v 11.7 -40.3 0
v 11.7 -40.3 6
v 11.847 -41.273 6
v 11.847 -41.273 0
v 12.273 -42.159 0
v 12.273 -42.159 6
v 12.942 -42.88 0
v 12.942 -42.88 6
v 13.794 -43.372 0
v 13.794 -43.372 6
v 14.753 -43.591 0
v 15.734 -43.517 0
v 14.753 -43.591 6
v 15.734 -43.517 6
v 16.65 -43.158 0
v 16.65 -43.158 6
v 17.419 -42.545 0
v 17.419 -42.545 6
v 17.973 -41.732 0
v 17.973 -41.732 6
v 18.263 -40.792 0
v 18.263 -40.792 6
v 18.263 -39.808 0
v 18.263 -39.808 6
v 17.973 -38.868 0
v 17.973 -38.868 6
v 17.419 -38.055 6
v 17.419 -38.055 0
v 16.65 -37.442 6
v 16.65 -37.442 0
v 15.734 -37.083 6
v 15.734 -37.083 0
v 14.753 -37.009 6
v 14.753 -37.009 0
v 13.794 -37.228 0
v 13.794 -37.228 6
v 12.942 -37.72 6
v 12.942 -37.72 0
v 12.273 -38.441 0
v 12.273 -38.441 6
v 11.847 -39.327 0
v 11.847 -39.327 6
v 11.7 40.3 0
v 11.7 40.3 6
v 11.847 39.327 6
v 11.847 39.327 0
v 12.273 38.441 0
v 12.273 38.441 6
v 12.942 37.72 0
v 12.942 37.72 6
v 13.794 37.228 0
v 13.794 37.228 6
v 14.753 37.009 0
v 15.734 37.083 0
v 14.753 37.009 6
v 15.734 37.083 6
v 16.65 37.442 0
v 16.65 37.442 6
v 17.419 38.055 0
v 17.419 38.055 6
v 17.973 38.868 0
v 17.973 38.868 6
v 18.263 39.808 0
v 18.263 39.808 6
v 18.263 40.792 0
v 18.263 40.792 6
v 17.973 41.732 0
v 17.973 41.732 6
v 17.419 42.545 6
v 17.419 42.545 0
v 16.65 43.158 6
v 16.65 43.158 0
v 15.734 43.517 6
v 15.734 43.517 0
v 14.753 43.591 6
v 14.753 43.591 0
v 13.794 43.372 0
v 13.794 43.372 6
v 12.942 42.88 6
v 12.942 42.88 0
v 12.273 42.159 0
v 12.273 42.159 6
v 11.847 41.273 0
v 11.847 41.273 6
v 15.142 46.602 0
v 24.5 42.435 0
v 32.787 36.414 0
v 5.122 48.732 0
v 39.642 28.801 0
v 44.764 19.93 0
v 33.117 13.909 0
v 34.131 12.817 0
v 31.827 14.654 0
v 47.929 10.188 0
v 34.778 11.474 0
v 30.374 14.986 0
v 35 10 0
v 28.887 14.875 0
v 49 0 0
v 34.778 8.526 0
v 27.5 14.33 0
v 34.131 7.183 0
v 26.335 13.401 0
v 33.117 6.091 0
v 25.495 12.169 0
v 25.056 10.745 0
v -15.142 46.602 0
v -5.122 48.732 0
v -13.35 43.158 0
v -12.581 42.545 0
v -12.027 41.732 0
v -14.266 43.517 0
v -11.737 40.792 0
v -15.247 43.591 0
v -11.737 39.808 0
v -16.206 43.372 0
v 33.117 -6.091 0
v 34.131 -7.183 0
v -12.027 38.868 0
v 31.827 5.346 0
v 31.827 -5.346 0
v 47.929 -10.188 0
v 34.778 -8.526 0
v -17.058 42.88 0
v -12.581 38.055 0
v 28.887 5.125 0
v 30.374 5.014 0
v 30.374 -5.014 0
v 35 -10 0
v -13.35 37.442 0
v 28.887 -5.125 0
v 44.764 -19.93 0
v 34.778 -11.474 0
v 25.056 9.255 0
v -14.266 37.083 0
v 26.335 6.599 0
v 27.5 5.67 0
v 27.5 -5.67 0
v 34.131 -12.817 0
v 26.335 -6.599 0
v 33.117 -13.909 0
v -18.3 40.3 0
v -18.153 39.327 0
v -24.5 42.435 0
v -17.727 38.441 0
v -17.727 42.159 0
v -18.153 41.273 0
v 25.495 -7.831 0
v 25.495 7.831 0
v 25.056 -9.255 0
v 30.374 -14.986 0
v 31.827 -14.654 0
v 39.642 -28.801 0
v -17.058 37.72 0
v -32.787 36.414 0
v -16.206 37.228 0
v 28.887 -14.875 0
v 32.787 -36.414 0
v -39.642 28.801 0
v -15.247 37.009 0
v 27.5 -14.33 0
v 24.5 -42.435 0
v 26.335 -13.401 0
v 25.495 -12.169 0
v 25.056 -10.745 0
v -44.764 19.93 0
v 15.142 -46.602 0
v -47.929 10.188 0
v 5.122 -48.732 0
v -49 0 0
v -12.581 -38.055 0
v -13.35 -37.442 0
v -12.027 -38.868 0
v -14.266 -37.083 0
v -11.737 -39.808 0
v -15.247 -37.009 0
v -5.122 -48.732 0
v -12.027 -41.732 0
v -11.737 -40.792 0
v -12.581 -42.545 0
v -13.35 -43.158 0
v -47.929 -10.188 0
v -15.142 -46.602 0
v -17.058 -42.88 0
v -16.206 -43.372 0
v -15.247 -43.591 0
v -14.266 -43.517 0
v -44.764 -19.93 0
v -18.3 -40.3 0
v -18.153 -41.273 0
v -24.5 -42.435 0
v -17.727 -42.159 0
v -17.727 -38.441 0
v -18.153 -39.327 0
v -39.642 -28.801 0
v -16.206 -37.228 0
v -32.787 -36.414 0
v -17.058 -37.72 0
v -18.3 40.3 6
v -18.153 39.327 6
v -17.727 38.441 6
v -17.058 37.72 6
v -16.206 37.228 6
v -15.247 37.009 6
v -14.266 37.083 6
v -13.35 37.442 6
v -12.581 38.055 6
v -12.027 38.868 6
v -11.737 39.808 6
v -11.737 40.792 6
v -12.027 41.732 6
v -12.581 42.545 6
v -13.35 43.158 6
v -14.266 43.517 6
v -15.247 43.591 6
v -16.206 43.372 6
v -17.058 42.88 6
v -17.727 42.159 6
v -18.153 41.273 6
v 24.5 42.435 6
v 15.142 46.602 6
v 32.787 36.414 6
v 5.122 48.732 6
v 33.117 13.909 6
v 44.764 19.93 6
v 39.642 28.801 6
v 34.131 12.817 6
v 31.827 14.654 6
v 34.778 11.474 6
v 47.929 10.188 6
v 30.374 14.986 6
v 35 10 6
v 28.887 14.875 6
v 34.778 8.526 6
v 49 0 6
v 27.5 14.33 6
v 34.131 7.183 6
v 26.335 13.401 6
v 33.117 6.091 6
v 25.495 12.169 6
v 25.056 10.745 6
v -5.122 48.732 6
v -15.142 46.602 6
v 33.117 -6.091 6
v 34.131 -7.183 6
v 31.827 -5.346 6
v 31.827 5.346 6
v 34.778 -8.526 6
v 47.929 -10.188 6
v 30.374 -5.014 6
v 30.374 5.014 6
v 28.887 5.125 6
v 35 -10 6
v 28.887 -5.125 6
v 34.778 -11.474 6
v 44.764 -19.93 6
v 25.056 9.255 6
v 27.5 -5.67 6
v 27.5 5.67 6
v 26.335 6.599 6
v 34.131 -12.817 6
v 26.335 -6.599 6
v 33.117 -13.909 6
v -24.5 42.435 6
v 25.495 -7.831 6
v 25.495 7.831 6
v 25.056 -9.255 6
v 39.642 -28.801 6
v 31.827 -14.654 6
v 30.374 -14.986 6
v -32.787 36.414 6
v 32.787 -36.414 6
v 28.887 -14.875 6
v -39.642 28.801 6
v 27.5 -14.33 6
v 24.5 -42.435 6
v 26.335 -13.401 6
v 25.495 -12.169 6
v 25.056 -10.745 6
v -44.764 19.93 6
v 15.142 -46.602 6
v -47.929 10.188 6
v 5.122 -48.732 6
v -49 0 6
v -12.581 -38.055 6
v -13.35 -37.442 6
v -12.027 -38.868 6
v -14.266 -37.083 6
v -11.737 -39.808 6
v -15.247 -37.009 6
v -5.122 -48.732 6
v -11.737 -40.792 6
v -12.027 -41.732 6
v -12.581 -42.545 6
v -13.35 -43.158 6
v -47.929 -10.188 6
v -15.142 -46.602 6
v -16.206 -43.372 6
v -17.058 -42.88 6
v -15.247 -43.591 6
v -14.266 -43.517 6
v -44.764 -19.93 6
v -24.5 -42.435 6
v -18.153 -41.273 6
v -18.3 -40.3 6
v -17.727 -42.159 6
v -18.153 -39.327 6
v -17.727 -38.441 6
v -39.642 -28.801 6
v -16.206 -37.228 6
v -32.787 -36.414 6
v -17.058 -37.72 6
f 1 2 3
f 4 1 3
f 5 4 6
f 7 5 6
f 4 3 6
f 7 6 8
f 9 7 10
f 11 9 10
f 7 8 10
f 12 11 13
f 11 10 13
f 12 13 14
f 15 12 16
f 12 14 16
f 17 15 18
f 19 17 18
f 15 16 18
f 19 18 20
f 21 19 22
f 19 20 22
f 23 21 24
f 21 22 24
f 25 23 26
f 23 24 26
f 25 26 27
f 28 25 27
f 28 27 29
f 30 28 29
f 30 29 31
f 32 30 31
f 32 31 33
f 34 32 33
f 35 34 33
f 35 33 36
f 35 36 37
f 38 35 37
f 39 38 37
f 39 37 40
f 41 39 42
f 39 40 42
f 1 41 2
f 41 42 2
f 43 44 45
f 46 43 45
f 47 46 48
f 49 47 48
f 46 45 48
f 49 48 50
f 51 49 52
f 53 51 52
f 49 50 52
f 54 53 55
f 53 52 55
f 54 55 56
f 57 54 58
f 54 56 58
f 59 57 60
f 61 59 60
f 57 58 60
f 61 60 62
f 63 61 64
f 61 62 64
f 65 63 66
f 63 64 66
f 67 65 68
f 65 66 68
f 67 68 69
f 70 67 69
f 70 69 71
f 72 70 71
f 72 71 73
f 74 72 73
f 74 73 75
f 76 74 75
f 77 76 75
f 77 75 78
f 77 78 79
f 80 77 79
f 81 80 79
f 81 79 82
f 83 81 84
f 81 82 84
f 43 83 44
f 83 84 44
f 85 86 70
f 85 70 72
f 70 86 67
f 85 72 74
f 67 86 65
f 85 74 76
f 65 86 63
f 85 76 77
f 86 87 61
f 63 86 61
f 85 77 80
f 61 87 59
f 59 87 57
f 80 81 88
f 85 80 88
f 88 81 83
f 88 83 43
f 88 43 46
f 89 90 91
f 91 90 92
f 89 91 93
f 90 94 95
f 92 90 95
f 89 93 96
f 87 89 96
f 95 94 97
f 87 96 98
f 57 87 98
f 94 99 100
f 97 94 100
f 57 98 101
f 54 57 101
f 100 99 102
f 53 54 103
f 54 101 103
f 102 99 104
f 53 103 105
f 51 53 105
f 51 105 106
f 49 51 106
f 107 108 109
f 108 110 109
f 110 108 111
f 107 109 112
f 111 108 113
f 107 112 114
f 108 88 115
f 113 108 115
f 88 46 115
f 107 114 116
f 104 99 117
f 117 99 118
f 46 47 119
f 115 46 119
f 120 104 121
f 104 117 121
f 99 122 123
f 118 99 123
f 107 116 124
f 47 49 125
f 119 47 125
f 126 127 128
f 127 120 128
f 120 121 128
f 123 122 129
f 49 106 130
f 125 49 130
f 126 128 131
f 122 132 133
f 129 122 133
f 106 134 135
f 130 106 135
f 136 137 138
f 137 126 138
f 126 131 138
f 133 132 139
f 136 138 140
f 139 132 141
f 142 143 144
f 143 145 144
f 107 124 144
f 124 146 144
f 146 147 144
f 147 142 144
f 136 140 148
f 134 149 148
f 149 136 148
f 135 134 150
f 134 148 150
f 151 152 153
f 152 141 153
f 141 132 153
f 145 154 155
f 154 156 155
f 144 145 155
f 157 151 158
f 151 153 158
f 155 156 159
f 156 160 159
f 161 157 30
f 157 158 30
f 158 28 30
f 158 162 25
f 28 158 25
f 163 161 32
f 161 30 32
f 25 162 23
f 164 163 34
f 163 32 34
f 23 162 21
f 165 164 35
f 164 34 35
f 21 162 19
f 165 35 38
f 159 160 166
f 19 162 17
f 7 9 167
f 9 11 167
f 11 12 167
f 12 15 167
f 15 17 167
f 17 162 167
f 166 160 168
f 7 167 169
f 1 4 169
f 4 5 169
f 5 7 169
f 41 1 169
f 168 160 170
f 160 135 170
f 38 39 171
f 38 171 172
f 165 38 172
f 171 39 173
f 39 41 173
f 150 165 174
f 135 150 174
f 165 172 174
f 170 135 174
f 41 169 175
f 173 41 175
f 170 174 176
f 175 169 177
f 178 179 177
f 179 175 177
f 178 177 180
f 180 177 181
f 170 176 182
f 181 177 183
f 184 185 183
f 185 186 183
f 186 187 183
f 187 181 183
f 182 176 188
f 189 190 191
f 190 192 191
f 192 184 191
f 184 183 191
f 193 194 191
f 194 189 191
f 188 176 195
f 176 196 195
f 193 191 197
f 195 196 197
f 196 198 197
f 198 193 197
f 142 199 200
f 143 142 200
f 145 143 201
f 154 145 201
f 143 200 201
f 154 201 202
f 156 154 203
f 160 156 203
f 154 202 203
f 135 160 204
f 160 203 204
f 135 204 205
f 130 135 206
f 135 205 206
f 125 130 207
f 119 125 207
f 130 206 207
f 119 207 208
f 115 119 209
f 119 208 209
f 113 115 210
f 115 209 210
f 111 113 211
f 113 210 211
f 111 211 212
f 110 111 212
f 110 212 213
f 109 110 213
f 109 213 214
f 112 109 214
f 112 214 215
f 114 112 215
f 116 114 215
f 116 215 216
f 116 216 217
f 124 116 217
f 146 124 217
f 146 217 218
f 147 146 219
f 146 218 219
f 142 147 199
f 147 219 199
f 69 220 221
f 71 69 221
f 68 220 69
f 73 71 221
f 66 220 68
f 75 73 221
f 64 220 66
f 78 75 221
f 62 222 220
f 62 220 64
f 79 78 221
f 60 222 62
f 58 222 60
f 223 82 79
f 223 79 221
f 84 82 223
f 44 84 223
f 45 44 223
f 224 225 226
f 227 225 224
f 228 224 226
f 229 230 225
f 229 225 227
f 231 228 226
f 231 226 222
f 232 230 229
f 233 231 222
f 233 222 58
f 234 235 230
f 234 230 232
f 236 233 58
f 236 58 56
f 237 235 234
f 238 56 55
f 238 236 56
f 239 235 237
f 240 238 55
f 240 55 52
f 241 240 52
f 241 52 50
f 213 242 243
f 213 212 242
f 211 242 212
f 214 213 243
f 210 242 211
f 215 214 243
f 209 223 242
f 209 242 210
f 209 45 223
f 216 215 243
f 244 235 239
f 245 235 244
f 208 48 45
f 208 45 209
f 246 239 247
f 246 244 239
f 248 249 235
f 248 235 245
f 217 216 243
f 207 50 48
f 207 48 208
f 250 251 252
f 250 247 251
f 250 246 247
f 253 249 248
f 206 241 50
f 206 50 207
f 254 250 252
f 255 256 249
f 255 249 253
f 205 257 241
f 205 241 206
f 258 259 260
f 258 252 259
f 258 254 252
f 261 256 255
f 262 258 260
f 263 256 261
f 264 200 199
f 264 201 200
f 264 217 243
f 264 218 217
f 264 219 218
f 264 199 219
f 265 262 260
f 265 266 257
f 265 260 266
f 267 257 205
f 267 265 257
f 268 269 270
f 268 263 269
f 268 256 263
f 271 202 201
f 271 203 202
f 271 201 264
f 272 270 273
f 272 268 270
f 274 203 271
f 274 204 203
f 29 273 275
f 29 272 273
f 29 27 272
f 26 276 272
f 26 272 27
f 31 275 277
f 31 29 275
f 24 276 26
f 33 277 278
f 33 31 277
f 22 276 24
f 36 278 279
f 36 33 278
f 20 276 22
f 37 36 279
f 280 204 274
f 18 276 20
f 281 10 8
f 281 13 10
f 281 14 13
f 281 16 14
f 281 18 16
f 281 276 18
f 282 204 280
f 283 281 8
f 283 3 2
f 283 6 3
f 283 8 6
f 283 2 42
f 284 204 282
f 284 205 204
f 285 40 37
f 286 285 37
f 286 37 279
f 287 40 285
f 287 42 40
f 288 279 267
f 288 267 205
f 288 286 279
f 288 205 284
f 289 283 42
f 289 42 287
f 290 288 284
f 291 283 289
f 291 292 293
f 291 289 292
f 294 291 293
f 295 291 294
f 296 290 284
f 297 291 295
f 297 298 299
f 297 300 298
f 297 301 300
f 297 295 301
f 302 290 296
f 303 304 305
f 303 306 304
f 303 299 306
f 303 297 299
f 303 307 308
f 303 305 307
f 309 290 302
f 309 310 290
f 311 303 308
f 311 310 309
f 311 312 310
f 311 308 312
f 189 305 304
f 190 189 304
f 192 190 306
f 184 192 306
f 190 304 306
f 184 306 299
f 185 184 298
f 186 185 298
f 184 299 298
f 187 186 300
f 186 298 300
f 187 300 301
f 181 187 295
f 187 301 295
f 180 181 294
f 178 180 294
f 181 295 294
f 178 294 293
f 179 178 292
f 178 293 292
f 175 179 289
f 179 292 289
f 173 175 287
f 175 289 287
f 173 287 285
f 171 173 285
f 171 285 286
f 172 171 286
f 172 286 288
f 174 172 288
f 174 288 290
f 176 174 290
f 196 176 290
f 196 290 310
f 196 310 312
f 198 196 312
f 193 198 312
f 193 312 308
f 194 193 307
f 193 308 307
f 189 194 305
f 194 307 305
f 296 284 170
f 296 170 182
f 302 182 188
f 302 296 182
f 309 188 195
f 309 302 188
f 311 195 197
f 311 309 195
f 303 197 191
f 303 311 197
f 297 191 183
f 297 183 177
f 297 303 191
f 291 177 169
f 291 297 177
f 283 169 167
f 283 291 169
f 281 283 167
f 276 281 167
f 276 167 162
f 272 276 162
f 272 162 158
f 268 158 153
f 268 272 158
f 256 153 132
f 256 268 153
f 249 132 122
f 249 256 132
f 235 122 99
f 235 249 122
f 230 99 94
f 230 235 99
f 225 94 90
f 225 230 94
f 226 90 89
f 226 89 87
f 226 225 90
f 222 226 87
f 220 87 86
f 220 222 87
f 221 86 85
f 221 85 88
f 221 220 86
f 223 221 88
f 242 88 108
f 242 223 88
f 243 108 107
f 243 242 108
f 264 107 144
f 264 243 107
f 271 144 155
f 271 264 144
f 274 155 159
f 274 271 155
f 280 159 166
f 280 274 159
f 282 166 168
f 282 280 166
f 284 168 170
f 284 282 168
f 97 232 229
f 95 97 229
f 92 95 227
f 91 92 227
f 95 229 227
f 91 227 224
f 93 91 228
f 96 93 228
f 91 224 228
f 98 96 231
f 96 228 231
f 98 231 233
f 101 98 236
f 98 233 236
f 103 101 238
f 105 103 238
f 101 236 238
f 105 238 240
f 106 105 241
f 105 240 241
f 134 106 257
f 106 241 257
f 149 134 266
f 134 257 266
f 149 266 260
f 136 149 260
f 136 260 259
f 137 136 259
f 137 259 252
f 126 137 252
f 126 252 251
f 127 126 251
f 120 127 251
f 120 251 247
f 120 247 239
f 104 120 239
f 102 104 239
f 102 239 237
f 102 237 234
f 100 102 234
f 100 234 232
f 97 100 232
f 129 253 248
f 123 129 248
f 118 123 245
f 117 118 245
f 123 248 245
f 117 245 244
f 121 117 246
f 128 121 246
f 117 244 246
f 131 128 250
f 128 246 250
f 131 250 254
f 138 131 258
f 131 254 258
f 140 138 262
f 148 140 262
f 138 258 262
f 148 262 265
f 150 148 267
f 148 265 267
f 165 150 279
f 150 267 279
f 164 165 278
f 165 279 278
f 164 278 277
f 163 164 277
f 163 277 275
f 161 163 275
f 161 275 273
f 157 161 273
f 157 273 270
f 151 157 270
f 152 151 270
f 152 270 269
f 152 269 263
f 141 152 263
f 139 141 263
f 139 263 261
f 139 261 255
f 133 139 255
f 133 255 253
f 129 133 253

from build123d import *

# Parameters (mm, degrees)
SKETCH_1_R          = 49
SKETCH_1_R_2        = 3.3
EXTRUDE_1_DEPTH     = 6
SKETCH_2_R          = 5
CUT_EXTRUDE_1_DEPTH = 70.555733049


with BuildPart() as part:
    # 草图1 → 凸台-拉伸1 (new body)
    with BuildSketch(Plane.XY.offset(6)):
        with Locations(Location((0, 0, 0), (0, 0, 180))):
            Circle(SKETCH_1_R)
        with Locations(Location((15, 40.300002161, 0), (0, 0, 180))):
            Circle(SKETCH_1_R_2, mode=Mode.SUBTRACT)
        with Locations(Location((15, -40.300002161, 0), (0, 0, 180))):
            Circle(SKETCH_1_R_2, mode=Mode.SUBTRACT)
        with Locations(Location((-15, 40.300002161, 0), (0, 0, 180))):
            Circle(SKETCH_1_R_2, mode=Mode.SUBTRACT)
        with Locations(Location((-15, -40.300002161, 0), (0, 0, 180))):
            Circle(SKETCH_1_R_2, mode=Mode.SUBTRACT)
    extrude(amount=-EXTRUDE_1_DEPTH)

    # 草图2 → 切除-拉伸1 (cut, through all)
    with BuildSketch(Plane.XY.offset(6)):
        with Locations((30, 10)):
            Circle(SKETCH_2_R)
        with Locations((30, -10)):
            Circle(SKETCH_2_R)
    extrude(amount=-CUT_EXTRUDE_1_DEPTH, mode=Mode.SUBTRACT)


solid = part.part
